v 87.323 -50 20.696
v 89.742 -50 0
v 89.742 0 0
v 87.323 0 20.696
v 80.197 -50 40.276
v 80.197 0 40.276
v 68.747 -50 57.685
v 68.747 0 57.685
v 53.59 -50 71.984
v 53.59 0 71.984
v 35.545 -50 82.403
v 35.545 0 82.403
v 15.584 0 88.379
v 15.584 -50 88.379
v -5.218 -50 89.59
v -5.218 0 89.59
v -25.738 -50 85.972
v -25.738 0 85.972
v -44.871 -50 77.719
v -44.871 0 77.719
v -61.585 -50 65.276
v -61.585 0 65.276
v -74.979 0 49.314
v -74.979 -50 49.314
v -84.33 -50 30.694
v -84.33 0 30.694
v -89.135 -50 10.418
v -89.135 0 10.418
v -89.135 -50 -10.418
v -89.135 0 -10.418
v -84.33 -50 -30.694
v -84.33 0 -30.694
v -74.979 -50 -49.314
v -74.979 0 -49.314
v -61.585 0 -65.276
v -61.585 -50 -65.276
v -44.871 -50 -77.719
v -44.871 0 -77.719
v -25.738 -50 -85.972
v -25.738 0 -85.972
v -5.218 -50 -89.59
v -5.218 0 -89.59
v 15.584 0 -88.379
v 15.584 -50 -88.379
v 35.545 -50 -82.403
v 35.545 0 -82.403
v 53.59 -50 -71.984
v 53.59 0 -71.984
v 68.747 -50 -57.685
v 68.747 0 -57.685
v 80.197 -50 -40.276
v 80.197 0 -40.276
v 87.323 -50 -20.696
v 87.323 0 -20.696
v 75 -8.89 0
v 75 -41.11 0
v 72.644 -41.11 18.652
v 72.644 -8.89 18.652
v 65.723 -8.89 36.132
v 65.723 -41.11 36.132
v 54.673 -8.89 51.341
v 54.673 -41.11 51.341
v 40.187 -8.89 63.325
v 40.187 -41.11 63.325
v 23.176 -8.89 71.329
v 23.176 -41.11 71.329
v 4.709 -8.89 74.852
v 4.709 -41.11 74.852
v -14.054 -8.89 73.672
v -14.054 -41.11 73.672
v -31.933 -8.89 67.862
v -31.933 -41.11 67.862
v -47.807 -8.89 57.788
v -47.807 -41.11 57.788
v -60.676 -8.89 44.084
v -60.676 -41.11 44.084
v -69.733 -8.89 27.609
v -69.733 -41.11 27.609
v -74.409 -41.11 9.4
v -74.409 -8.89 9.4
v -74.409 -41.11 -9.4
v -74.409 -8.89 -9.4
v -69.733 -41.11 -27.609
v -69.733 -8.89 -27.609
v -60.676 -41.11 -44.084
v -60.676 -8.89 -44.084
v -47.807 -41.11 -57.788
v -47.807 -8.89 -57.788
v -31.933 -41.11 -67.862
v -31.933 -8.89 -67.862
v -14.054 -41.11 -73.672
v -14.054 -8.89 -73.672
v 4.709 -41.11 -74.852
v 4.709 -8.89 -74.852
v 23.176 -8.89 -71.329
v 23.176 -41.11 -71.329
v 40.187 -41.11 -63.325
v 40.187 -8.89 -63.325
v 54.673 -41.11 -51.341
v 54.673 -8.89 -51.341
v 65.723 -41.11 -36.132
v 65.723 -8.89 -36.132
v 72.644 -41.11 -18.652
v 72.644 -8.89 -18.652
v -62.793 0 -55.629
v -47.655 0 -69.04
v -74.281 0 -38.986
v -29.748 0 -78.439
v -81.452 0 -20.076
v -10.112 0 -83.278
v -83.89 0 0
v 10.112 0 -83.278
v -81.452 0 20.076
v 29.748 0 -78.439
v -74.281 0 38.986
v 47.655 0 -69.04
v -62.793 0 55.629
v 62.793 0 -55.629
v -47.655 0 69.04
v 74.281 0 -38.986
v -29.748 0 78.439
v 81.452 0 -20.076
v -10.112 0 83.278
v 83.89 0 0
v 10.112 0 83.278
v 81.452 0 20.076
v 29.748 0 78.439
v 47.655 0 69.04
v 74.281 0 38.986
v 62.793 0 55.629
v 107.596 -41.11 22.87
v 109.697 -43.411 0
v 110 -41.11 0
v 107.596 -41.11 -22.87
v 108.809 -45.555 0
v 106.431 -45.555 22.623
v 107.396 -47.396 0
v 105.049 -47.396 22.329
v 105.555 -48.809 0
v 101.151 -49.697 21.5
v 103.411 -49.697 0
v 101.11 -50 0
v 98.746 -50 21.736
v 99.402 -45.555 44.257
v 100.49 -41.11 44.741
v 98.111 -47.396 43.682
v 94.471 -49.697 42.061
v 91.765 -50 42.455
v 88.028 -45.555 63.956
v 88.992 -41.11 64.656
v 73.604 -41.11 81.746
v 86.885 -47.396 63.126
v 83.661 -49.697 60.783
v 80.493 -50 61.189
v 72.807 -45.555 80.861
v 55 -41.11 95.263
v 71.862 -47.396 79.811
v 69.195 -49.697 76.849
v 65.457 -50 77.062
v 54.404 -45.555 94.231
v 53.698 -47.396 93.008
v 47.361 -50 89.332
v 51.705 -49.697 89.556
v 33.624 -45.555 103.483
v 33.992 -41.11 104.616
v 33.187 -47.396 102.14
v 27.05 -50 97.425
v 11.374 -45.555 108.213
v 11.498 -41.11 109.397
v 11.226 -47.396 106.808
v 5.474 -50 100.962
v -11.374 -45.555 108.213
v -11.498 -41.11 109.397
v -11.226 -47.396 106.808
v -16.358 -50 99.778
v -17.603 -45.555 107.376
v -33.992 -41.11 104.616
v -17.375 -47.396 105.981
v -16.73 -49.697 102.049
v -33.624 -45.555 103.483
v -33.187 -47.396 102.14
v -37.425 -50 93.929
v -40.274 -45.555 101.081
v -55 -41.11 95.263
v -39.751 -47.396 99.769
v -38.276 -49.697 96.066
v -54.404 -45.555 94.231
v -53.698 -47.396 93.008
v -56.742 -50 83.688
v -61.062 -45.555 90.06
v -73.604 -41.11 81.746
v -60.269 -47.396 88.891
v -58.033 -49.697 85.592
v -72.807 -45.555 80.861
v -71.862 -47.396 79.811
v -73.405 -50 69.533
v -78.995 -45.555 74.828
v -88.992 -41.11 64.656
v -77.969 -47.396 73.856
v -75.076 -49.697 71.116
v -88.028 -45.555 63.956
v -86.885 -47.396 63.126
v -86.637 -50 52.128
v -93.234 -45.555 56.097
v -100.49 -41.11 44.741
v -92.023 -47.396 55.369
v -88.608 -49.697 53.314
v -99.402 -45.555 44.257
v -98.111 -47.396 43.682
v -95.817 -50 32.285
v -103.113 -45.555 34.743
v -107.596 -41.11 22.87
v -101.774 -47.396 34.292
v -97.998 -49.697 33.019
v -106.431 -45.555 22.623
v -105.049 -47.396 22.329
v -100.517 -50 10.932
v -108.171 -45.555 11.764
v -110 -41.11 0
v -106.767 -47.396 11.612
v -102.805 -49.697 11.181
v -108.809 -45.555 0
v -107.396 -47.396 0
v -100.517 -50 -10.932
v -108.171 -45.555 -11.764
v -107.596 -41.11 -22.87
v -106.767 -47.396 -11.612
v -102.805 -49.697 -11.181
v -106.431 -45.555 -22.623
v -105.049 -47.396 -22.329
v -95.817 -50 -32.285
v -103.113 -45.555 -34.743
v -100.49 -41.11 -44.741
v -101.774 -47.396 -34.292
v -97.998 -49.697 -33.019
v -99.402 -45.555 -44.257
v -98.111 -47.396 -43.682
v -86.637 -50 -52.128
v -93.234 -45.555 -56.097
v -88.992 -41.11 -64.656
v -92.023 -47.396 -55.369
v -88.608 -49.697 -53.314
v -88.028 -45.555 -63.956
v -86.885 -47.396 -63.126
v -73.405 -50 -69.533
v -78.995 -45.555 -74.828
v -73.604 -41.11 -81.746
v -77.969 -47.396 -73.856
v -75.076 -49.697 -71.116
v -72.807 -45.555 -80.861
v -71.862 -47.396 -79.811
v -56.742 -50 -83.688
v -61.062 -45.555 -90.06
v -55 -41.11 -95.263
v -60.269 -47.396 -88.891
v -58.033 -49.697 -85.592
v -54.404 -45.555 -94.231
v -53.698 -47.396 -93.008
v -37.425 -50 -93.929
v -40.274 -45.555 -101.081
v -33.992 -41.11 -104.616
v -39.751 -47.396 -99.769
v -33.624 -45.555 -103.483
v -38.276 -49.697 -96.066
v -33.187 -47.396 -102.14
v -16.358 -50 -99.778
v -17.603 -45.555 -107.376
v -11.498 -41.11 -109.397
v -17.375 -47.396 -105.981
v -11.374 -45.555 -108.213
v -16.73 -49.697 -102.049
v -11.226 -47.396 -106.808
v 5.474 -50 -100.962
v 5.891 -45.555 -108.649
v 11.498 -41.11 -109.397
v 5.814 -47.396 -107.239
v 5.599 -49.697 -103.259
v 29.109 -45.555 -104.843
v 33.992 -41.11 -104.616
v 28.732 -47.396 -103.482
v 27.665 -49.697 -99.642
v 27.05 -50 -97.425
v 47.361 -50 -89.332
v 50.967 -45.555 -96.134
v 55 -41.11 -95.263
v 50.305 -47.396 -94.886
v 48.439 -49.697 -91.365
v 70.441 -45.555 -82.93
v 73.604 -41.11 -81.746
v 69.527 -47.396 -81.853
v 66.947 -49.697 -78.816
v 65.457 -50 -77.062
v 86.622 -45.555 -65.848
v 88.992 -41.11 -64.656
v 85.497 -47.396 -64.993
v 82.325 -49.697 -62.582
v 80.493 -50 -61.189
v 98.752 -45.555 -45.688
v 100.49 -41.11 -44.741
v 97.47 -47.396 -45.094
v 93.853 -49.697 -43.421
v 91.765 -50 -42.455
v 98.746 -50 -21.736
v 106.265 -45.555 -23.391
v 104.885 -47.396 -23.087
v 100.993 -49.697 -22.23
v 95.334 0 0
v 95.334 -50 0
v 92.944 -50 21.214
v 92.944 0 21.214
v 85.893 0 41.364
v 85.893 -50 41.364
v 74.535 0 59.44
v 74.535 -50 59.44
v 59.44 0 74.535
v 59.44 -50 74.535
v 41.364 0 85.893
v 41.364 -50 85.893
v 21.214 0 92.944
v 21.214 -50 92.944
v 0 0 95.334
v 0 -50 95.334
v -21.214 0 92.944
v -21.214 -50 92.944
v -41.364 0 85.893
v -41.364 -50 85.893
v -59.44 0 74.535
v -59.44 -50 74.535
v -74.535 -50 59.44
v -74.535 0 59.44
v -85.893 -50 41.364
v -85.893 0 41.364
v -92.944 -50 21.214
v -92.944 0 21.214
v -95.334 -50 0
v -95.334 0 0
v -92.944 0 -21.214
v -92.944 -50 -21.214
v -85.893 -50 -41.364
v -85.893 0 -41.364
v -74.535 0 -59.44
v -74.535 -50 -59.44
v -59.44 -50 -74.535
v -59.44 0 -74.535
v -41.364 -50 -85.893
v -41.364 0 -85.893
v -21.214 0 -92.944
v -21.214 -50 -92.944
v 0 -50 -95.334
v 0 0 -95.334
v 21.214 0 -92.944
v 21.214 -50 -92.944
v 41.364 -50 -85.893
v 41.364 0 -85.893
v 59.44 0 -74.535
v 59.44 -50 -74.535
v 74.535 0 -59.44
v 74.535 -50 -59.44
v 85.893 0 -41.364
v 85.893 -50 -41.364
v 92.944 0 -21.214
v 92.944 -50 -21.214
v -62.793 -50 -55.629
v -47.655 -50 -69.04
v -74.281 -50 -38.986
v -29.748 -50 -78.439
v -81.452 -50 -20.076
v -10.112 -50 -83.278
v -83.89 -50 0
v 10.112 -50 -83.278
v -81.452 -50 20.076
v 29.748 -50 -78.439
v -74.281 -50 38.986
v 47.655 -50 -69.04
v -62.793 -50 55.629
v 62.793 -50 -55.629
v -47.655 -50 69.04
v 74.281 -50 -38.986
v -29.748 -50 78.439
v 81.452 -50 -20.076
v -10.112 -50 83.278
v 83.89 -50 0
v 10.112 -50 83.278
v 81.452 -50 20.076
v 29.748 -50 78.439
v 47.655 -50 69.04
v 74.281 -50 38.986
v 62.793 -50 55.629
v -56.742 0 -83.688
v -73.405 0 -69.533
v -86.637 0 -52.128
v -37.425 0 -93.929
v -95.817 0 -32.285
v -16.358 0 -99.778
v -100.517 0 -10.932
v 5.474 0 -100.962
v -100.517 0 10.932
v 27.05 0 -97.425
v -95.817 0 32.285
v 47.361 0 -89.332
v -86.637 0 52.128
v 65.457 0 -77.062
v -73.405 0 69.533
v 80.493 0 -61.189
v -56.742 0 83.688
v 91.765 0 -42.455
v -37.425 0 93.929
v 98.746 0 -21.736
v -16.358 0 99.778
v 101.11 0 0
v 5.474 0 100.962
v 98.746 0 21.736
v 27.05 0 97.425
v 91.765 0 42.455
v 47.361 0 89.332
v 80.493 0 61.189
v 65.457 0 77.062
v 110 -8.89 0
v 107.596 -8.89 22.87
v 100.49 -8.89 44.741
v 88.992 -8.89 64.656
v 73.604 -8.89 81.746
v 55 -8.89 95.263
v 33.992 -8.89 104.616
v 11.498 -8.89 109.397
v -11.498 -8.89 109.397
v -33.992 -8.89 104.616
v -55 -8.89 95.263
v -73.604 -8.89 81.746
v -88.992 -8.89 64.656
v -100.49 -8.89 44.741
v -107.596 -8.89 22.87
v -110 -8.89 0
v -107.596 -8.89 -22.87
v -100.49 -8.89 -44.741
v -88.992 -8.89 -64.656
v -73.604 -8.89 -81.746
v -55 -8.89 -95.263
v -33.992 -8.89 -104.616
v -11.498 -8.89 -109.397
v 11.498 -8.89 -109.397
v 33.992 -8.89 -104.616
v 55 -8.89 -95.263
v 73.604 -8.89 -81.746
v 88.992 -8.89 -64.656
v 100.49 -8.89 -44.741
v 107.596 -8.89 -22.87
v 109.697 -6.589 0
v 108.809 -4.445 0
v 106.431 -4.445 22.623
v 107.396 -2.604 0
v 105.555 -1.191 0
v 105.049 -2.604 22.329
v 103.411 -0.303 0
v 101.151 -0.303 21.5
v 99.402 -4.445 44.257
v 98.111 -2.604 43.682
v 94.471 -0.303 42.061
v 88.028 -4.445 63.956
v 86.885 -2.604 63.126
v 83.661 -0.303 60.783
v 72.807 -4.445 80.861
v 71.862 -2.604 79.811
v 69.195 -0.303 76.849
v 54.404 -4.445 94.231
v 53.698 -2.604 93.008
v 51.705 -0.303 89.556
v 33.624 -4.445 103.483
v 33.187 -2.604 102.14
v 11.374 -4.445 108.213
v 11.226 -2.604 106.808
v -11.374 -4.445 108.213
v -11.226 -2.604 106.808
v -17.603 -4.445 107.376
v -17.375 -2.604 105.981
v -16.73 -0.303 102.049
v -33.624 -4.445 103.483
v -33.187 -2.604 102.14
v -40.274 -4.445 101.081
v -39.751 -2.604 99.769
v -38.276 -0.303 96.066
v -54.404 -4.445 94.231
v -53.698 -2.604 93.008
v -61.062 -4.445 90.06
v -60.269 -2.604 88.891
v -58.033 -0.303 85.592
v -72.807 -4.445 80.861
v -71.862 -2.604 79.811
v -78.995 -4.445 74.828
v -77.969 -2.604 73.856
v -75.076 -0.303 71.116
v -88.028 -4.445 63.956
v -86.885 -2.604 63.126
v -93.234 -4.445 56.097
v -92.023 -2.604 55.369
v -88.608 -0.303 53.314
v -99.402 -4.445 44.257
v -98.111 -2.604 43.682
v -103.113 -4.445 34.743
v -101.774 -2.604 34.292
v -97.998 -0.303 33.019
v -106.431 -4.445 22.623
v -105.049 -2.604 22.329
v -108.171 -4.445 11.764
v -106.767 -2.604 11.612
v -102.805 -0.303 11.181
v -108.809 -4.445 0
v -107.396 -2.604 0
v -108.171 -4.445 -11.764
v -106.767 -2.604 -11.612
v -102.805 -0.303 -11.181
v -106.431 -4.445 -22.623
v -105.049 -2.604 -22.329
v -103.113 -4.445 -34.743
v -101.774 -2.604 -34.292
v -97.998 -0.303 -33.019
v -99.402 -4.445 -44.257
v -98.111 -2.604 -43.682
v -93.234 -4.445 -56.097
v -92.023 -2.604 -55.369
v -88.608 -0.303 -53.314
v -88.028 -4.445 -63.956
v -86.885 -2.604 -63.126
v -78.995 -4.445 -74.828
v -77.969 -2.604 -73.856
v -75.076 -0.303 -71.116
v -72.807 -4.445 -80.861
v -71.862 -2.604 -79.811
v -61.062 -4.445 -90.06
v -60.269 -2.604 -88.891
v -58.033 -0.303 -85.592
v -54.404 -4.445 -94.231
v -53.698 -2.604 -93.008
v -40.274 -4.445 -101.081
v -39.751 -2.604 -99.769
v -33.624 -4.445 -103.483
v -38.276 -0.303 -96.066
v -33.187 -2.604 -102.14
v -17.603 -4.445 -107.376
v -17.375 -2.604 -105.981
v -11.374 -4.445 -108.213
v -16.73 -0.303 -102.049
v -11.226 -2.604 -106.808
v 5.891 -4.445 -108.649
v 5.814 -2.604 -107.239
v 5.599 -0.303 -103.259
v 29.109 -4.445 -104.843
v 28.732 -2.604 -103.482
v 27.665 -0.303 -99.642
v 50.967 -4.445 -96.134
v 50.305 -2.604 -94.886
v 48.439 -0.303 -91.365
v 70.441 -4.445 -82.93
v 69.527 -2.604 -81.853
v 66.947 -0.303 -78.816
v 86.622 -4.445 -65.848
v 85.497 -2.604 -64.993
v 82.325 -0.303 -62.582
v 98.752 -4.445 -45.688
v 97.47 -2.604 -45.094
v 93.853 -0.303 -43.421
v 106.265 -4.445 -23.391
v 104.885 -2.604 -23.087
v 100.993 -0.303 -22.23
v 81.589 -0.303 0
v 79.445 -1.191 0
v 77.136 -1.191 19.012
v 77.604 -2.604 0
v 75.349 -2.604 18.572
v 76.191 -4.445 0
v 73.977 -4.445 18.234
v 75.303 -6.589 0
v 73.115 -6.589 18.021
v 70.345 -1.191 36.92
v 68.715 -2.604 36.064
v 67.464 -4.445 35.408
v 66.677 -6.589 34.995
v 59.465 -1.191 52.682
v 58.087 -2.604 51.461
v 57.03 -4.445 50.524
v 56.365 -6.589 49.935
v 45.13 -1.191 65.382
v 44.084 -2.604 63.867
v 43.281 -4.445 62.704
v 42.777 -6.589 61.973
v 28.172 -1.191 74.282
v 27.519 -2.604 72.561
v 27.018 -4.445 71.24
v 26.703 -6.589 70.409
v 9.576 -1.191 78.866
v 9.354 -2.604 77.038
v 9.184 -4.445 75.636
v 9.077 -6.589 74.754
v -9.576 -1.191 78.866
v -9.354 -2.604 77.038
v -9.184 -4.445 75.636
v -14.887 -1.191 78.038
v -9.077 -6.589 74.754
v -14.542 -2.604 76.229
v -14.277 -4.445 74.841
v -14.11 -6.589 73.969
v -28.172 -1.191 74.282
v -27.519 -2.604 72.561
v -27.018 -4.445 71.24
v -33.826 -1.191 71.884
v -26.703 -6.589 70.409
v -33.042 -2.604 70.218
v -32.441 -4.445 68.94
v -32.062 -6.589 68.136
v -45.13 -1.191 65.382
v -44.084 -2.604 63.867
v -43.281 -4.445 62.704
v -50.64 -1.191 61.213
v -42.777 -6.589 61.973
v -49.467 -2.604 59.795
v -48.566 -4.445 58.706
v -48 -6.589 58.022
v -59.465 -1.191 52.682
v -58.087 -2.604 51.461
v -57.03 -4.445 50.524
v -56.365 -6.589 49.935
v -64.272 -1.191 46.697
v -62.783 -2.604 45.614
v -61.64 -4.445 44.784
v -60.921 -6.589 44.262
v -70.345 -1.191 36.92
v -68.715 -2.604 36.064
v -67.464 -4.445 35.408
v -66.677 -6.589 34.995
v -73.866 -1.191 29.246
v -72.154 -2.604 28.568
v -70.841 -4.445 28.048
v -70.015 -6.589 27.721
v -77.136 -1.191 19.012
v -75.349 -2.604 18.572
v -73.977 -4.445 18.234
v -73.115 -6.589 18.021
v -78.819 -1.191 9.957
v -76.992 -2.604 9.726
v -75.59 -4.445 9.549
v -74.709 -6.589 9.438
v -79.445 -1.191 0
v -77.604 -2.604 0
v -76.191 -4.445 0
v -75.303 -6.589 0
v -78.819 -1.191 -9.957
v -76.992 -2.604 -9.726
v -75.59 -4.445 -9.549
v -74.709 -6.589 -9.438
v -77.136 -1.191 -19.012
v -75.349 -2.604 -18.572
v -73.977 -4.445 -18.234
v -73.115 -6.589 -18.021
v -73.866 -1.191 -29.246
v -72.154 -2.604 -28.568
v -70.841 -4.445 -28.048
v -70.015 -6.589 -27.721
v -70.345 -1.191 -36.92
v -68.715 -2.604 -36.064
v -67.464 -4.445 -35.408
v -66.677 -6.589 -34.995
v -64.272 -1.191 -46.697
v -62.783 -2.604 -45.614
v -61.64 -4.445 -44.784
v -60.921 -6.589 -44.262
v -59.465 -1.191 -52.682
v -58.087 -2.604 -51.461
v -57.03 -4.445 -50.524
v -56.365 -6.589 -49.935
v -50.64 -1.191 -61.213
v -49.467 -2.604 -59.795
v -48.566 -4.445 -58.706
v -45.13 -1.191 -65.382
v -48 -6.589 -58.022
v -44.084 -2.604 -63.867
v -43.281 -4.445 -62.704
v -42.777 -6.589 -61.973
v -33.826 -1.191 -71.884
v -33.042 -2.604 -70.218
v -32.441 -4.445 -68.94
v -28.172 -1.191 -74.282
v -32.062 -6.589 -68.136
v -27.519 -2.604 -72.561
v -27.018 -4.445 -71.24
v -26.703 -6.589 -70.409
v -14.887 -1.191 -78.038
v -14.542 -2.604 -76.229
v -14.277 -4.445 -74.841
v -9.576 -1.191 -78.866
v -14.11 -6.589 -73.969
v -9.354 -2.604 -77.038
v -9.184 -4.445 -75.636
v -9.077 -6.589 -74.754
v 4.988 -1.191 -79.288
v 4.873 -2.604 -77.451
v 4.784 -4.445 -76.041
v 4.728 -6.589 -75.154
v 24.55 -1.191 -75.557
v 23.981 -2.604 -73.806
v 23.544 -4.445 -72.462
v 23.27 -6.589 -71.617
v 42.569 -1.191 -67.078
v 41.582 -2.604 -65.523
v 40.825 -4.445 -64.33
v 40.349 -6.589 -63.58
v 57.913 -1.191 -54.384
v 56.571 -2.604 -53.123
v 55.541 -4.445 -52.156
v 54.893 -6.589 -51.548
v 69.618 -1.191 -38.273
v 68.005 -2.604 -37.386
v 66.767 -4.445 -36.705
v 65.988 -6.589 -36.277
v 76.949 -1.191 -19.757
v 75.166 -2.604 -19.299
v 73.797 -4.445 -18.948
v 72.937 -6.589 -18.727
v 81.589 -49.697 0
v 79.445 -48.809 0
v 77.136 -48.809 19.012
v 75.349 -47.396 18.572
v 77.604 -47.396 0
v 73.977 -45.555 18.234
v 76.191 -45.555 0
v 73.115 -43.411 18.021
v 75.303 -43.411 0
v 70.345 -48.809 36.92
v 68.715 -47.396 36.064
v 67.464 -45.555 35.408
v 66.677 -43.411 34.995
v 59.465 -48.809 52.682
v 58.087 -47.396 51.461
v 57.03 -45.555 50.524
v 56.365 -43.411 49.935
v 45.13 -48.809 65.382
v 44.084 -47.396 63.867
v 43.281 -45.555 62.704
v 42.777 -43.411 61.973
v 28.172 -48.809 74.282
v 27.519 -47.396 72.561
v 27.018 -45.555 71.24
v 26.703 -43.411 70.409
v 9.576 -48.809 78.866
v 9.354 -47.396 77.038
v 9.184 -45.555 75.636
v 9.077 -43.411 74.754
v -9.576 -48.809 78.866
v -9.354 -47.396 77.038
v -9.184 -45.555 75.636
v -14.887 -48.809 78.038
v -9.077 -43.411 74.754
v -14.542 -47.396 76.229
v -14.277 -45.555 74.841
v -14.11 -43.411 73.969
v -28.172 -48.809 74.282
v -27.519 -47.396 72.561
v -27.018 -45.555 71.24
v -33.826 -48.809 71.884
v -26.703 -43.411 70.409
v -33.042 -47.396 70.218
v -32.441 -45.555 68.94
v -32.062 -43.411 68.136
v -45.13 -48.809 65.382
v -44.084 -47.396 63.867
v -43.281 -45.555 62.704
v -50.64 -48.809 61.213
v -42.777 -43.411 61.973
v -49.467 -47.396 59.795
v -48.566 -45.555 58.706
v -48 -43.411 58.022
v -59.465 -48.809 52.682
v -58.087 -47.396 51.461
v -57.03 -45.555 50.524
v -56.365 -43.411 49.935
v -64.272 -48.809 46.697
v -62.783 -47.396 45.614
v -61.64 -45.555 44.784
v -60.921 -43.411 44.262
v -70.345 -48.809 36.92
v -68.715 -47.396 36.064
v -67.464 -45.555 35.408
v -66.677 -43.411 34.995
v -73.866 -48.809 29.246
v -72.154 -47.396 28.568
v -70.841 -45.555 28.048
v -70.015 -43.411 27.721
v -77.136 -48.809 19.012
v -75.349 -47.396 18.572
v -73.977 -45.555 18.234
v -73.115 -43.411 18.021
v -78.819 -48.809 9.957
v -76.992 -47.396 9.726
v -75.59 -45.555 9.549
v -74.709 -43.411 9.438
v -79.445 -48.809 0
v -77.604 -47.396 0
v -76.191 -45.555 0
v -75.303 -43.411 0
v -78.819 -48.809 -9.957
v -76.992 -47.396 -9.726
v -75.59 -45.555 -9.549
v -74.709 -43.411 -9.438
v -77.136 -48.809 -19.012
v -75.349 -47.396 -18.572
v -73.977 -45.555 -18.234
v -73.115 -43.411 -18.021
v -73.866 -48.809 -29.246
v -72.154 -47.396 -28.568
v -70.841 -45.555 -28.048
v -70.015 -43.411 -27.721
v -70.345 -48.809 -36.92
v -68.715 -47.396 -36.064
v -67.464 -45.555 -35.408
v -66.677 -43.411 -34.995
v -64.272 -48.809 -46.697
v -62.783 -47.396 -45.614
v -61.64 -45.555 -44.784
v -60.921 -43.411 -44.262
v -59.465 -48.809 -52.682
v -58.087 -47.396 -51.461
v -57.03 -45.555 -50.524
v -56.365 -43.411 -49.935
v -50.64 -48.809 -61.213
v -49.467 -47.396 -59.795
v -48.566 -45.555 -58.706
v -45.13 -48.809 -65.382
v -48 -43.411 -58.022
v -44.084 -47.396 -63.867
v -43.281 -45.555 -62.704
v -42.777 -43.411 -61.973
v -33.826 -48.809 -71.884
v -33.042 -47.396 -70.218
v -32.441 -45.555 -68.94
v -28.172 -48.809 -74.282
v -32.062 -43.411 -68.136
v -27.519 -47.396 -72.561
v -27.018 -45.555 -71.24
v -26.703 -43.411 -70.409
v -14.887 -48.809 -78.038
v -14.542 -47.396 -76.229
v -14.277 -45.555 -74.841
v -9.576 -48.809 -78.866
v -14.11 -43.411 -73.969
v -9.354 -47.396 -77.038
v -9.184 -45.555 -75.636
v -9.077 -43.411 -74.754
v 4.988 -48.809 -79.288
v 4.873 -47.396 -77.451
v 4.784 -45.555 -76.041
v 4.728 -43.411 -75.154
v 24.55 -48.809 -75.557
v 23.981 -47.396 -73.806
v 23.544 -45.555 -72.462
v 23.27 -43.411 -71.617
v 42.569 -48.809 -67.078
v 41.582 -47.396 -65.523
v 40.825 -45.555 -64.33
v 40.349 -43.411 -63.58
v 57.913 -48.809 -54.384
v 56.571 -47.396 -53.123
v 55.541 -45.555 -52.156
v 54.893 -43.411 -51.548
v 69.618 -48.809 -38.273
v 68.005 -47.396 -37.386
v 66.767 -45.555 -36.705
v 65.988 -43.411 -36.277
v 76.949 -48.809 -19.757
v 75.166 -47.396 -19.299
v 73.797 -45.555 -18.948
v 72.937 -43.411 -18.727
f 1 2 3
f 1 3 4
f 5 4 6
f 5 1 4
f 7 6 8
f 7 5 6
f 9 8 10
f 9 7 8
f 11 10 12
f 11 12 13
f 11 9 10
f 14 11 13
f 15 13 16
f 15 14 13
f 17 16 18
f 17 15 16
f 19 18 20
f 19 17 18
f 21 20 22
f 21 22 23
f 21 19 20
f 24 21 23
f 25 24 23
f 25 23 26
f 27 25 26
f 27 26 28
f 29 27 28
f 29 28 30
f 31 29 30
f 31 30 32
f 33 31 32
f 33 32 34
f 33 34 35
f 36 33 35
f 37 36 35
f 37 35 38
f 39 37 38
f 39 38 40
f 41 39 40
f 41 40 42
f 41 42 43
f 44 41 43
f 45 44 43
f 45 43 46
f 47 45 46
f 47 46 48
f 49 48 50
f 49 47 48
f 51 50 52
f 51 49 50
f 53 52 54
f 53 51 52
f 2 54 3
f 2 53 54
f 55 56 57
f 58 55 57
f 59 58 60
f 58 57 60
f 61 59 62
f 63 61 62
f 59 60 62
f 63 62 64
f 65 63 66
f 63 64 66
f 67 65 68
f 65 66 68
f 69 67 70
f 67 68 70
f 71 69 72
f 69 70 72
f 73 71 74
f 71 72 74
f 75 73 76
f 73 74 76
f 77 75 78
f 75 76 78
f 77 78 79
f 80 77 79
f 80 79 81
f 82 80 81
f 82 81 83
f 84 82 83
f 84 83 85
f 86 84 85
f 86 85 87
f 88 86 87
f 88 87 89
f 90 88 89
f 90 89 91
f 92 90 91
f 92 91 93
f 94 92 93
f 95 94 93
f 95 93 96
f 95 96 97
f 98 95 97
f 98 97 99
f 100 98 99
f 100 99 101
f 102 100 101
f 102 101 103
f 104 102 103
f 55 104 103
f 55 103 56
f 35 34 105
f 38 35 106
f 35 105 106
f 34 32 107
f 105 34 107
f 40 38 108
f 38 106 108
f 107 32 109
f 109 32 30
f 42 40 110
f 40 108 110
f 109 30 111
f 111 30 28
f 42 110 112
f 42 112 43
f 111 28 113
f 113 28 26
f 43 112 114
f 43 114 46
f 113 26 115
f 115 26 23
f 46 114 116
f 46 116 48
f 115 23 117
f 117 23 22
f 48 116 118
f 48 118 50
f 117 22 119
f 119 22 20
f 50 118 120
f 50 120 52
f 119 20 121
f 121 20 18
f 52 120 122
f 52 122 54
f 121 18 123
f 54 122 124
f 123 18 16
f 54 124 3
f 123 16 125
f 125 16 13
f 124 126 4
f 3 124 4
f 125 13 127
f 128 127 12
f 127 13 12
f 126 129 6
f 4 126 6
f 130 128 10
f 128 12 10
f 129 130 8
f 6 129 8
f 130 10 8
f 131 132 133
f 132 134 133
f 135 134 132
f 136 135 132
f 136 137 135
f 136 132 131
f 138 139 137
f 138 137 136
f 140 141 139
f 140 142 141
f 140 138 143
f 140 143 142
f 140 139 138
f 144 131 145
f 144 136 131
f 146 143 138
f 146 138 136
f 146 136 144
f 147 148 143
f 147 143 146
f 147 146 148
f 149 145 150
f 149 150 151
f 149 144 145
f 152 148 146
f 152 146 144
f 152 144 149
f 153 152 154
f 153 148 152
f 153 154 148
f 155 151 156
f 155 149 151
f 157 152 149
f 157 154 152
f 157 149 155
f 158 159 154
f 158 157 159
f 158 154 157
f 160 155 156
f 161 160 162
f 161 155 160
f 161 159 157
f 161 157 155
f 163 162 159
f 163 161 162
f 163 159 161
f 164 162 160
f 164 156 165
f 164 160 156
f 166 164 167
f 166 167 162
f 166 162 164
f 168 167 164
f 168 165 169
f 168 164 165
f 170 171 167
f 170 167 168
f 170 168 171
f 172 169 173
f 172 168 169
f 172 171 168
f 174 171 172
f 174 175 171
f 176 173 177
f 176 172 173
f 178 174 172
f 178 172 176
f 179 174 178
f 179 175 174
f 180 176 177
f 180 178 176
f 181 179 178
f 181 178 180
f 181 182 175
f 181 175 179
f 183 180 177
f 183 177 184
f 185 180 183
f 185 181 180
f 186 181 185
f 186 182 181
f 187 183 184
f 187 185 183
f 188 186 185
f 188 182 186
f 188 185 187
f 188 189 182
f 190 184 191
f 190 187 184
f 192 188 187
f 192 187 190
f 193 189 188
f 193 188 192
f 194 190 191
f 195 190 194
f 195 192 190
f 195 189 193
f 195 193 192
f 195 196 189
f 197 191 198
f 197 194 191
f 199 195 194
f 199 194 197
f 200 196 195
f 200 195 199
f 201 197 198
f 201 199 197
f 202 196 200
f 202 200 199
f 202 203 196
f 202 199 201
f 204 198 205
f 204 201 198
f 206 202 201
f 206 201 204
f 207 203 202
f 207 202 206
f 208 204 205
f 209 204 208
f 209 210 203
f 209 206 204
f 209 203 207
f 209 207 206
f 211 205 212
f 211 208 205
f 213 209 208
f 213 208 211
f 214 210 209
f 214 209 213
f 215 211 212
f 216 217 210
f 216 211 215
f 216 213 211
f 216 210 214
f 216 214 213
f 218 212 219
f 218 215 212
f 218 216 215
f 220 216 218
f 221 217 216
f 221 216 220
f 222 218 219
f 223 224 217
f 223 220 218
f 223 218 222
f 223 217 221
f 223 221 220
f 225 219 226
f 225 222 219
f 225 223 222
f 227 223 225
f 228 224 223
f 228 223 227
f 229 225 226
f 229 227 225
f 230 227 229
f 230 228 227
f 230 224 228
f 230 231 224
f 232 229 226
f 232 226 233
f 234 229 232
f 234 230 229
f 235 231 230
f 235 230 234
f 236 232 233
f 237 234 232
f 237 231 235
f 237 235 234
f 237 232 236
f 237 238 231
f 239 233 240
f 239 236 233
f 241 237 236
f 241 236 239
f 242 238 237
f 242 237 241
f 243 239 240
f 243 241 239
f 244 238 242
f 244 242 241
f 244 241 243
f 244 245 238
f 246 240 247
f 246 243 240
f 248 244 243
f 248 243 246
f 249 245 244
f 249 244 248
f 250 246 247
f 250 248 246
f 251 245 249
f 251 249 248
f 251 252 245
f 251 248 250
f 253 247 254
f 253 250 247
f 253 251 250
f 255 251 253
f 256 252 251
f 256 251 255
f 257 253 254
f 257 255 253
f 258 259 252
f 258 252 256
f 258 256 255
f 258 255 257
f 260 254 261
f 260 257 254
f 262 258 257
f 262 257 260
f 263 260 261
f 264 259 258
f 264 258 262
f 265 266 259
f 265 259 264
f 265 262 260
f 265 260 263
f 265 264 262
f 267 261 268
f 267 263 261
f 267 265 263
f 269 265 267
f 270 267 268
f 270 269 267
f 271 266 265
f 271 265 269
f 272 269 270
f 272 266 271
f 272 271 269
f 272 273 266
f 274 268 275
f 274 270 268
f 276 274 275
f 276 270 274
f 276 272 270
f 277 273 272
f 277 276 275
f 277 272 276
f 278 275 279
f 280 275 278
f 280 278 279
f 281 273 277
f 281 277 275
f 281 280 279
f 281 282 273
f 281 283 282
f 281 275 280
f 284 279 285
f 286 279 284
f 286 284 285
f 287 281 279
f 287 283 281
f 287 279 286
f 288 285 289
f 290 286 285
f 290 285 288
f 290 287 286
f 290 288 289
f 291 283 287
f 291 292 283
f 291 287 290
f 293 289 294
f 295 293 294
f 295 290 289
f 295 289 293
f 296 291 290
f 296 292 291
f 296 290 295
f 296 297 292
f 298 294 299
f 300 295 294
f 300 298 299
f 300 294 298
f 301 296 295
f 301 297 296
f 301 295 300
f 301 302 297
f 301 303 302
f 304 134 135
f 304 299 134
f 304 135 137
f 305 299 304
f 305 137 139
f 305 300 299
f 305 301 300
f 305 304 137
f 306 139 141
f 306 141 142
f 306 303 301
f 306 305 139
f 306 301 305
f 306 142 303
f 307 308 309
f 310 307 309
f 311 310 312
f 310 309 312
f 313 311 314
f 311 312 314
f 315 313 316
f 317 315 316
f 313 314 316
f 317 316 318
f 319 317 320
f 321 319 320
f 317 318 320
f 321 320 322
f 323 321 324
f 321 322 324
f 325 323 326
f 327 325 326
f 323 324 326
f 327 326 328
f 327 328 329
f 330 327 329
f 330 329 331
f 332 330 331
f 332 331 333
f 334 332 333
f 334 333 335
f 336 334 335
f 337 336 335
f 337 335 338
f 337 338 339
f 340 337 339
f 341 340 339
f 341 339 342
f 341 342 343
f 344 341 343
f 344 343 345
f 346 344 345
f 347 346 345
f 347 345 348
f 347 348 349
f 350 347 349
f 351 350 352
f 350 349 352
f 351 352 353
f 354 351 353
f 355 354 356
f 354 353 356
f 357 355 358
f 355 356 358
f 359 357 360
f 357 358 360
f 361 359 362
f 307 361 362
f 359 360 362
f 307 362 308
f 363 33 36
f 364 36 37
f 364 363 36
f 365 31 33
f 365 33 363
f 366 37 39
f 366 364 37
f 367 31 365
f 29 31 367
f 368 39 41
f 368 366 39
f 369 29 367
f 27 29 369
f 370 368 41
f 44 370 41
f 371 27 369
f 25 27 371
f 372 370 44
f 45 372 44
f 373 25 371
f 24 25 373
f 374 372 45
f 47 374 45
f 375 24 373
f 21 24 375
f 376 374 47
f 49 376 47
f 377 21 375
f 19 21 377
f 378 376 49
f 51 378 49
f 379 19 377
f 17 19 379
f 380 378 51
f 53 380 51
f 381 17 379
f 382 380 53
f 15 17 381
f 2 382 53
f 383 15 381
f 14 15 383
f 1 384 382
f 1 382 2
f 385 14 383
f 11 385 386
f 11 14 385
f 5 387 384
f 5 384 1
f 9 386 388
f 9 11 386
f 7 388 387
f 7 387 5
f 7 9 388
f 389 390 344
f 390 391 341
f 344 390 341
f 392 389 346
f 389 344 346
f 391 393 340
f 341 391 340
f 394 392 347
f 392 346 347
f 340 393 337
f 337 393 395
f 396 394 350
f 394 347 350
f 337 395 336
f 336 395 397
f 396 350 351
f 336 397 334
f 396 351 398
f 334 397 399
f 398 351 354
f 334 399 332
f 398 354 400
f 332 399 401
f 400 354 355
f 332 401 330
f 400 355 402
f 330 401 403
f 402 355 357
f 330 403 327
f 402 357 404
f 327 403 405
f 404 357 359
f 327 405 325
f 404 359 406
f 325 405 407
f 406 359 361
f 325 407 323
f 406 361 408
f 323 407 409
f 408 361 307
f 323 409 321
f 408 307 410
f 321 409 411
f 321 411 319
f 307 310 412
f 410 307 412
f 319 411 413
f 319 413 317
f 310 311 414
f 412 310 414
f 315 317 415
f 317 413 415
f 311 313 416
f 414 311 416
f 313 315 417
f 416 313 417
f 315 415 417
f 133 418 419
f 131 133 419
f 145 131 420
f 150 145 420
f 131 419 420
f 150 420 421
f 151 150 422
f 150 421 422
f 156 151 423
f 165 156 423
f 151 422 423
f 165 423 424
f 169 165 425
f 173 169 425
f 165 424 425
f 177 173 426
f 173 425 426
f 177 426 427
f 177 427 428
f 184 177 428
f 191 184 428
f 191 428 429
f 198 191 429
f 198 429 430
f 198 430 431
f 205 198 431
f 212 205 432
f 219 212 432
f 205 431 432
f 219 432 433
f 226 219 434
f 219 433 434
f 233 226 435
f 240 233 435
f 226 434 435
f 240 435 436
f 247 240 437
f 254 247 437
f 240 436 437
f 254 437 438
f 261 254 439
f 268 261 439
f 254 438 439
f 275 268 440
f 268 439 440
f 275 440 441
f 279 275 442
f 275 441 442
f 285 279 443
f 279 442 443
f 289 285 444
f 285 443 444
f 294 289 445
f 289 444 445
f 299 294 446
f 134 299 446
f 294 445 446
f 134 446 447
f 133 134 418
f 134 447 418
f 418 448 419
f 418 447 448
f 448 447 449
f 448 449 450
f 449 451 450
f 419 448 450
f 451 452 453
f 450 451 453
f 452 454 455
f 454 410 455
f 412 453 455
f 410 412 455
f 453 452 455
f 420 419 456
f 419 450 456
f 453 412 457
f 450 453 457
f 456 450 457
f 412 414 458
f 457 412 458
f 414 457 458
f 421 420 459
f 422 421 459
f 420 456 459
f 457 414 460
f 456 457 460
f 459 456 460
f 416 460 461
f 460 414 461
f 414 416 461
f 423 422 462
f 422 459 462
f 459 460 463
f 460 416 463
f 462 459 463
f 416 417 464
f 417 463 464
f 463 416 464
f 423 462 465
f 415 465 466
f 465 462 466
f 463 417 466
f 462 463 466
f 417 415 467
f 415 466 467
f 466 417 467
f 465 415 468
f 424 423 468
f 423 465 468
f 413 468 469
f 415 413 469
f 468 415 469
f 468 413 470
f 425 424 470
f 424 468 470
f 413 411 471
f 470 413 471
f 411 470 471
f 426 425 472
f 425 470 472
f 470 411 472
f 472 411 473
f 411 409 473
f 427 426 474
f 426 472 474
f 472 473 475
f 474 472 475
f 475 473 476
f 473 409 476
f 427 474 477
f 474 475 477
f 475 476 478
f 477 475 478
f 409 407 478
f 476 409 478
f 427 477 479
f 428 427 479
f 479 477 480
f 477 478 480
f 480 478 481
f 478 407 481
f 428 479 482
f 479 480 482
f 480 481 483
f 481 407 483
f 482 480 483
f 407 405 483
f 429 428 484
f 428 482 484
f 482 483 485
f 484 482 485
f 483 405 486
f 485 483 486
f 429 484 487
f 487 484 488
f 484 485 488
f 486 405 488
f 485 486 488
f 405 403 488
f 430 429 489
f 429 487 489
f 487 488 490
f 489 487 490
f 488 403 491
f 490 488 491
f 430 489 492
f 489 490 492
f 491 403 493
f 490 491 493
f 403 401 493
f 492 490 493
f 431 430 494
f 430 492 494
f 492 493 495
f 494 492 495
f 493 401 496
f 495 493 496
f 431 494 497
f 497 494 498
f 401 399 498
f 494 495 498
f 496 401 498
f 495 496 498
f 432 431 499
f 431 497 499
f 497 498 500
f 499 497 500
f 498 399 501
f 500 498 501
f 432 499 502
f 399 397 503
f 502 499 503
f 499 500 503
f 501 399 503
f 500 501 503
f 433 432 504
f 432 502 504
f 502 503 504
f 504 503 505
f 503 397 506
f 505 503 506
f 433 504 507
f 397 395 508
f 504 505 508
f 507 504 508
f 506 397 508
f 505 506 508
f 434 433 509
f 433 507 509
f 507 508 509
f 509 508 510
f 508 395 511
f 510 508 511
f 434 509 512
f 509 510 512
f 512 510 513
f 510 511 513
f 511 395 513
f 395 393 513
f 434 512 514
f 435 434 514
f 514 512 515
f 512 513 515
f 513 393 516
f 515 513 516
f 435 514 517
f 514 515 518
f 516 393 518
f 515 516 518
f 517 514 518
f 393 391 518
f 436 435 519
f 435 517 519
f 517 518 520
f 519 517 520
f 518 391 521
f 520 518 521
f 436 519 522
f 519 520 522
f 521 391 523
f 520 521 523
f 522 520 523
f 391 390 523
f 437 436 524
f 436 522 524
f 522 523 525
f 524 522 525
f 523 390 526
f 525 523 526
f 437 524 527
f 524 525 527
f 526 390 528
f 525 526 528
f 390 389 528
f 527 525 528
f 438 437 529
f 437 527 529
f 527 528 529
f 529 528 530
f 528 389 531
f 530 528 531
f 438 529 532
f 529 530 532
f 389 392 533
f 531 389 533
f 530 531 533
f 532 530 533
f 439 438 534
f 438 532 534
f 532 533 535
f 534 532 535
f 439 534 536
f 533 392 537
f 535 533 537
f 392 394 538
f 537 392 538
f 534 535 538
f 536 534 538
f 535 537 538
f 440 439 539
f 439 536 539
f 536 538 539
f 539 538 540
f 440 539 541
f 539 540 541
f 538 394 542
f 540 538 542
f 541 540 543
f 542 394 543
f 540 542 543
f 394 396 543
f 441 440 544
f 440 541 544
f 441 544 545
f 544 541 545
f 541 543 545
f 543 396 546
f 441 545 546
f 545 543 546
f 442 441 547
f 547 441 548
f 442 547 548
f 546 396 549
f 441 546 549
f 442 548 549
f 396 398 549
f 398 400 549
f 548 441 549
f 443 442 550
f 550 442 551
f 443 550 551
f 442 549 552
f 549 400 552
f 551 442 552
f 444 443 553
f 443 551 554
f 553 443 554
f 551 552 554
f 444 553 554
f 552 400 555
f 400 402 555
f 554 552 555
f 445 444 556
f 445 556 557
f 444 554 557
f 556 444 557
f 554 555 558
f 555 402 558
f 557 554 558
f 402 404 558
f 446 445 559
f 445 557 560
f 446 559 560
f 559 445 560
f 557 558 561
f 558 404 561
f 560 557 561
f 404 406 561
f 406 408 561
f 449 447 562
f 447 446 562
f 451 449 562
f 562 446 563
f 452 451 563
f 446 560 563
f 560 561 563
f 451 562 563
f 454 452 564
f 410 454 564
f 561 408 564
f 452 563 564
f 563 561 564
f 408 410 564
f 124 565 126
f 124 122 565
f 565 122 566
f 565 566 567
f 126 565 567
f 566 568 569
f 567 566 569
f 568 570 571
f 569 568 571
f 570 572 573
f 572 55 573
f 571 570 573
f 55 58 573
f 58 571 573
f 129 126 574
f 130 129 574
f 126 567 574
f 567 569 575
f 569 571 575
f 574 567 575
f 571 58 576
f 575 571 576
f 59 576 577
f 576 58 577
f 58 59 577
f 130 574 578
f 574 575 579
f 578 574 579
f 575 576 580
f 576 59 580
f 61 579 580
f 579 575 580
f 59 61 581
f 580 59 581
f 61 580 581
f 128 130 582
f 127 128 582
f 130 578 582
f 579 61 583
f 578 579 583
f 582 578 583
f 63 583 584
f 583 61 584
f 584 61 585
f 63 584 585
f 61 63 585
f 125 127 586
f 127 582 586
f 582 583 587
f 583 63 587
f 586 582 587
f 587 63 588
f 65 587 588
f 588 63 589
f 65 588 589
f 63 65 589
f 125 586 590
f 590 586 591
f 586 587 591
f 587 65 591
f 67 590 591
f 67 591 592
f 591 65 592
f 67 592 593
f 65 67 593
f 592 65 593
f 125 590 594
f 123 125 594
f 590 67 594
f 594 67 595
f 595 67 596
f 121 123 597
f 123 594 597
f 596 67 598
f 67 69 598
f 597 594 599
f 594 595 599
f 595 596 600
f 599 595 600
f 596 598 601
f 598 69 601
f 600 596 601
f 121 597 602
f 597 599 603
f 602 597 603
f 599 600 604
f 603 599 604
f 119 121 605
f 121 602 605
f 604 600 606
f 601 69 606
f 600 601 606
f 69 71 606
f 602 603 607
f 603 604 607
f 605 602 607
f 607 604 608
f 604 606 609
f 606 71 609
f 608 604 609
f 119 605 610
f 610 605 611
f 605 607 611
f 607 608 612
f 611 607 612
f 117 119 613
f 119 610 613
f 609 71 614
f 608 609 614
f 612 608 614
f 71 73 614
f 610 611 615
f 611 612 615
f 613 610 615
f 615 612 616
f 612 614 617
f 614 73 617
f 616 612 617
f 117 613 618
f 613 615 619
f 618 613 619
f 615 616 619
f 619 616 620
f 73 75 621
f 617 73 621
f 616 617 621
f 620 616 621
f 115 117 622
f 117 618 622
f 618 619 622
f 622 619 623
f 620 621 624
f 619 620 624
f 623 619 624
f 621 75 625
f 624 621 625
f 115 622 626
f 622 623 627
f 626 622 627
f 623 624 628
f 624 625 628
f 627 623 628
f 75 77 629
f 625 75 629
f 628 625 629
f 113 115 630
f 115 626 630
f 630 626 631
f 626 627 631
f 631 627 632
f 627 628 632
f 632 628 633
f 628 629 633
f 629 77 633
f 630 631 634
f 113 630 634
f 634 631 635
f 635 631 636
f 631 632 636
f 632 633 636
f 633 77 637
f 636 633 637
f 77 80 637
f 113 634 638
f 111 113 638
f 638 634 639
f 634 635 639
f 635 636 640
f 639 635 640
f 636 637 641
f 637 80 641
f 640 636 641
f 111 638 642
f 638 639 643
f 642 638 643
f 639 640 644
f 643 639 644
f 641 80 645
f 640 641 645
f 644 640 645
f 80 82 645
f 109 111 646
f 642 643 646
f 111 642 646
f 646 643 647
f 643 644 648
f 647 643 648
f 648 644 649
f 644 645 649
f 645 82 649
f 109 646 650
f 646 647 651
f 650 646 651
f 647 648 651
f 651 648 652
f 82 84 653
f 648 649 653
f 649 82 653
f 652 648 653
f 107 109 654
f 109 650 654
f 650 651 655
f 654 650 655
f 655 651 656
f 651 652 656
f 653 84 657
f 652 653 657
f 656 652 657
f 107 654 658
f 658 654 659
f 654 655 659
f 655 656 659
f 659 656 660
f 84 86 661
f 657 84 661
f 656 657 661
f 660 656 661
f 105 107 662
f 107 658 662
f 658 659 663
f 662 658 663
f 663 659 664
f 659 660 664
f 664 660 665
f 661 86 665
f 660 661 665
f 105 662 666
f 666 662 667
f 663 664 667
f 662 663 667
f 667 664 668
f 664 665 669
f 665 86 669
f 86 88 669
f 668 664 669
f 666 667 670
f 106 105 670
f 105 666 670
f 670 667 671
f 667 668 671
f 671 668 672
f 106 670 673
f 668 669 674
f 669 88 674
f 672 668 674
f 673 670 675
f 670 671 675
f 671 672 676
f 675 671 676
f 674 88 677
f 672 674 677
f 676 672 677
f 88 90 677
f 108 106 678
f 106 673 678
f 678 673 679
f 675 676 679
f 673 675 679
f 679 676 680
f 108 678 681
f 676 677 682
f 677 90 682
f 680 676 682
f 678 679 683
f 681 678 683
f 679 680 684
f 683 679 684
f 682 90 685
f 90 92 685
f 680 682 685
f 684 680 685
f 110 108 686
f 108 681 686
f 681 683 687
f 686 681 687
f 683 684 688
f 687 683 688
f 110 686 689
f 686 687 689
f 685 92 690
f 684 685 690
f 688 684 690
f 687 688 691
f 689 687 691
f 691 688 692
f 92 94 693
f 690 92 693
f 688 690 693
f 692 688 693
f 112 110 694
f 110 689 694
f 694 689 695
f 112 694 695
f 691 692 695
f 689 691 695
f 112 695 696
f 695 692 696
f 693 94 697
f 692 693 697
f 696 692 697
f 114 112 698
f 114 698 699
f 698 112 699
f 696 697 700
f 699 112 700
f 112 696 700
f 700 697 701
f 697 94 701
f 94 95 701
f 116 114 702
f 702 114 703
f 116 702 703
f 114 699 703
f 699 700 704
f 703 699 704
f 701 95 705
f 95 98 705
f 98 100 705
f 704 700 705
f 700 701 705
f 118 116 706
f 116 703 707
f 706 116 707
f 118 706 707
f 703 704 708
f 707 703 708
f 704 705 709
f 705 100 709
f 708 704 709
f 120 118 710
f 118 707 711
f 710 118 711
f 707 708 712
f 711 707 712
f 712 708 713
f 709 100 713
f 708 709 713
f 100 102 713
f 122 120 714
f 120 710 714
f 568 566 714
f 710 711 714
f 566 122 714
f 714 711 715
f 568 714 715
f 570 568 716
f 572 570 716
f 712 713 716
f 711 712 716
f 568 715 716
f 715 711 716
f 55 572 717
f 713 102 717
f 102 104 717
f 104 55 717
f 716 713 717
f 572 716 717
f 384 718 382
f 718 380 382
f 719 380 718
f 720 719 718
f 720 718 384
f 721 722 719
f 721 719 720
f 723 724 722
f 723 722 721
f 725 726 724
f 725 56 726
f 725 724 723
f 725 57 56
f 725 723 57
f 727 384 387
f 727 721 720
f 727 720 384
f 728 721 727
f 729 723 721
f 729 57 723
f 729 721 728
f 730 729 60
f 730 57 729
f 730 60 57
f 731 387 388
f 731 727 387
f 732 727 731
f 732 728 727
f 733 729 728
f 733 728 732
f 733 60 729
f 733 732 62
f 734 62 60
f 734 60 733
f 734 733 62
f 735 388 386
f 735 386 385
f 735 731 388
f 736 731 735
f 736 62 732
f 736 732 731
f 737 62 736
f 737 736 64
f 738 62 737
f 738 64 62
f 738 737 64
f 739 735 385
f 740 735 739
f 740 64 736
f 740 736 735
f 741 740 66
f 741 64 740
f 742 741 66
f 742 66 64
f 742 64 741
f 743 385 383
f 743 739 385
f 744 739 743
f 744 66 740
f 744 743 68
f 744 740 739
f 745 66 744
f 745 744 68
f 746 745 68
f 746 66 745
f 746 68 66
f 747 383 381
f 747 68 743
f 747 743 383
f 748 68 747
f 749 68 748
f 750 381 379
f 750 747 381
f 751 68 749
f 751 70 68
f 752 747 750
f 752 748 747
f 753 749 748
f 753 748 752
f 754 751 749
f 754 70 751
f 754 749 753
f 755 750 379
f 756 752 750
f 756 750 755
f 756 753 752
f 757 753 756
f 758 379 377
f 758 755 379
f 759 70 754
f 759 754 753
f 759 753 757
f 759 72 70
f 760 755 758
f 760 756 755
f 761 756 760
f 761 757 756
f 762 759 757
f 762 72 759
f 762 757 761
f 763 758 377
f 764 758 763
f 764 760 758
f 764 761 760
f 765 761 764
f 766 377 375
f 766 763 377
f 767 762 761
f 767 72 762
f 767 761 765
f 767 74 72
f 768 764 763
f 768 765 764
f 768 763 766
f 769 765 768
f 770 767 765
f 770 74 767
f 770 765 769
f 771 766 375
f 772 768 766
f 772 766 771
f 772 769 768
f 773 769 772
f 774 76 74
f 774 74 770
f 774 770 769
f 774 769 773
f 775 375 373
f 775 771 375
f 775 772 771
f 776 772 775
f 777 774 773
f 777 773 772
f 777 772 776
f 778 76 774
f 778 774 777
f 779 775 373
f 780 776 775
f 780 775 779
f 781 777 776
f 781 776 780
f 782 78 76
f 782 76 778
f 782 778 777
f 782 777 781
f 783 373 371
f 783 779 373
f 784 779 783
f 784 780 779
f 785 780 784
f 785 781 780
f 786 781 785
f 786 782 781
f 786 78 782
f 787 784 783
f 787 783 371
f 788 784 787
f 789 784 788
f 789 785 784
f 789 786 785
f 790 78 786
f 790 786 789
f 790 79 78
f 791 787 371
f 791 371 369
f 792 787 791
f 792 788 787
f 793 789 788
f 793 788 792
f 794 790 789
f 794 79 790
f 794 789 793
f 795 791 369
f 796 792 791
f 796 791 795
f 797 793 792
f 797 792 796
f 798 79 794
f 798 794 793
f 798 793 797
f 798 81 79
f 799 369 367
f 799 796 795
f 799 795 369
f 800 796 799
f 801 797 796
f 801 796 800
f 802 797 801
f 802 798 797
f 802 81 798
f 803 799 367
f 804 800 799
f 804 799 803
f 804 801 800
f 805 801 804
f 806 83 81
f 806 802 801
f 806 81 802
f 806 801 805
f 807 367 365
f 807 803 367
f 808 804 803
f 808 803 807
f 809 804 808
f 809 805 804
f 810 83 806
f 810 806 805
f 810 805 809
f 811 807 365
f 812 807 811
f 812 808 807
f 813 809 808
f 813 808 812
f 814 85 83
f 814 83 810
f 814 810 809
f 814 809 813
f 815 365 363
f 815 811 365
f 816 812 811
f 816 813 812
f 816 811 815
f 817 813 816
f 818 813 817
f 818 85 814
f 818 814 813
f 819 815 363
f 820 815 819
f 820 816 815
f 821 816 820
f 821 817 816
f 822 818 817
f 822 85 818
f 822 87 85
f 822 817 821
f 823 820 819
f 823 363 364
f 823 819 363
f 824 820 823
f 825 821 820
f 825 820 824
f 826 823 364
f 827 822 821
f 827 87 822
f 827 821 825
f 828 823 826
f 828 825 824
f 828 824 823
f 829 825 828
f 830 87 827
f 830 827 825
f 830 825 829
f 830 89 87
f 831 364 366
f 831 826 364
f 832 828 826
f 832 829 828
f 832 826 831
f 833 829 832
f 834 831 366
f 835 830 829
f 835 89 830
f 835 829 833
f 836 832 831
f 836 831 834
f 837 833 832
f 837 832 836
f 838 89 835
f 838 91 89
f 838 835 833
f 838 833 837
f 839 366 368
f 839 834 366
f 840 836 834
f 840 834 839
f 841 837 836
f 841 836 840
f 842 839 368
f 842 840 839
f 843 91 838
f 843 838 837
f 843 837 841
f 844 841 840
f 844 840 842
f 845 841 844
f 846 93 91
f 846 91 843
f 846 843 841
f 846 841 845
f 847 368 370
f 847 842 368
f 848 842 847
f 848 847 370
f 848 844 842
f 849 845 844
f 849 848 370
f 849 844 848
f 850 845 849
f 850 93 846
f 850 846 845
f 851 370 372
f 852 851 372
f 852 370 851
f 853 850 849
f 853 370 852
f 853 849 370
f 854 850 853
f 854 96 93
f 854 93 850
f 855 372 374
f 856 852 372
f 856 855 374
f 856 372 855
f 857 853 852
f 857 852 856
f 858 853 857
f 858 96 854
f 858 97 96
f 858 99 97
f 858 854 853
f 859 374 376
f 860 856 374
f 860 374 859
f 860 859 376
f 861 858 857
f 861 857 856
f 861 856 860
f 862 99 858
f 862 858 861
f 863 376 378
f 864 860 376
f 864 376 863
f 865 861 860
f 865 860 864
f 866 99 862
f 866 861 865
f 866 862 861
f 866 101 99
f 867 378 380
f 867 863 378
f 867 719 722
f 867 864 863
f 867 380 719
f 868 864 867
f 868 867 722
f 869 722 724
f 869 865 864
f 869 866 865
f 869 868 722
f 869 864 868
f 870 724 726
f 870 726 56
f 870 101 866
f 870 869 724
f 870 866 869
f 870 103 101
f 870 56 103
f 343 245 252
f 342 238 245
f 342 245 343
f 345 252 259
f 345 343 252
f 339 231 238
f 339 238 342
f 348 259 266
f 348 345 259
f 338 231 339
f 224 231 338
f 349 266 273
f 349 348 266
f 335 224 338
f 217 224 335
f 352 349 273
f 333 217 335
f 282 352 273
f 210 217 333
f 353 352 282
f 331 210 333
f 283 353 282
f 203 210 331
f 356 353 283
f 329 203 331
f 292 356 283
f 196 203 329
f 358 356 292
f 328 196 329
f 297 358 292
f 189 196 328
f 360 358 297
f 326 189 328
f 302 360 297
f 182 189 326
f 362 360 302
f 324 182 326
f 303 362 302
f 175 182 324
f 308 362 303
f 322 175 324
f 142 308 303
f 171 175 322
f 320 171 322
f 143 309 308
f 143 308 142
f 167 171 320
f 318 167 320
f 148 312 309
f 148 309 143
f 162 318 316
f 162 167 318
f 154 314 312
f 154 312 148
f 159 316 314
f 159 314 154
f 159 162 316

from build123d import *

# Parameters (mm, degrees)
F0_R     = 110
F1_DEPTH = 50
F2_R     = 75
F3_DEPTH = 50.001
F7_R     = 8.89
F8_R     = 95.3337412029
F8_R_2   = 89.742282657
F9_DEPTH = 50.001


# Not quite as in the source:
# - the program builds the solid bodies; features that only make, move or delete a surface that nothing else refers to are left out


with BuildPart() as f1:
    # F0 (on Front) → F1 (new body)
    with BuildSketch(Plane.XZ):
        Circle(F0_R)
    extrude(amount=F1_DEPTH)

    # F2 (on face) → F3 (cut, through all)
    with BuildSketch(Plane.XZ.offset(50)):
        Circle(F2_R)
    extrude(amount=-F3_DEPTH, mode=Mode.SUBTRACT)

    # F7
    f7_edges = [f1.edges().sort_by_distance(p)[0] for p in [
        (-110, -50, 0),
        (-75, -50, 0),
        (-110, 0, 0),
        (-75, 0, 0),
    ]]
    fillet(f7_edges, radius=F7_R)

    # F8 (on face) → F9 (cut, through all)
    with BuildSketch(Plane.XZ.offset(50)):
        Circle(F8_R)
        Circle(F8_R_2, mode=Mode.SUBTRACT)
    extrude(amount=-F9_DEPTH, mode=Mode.SUBTRACT)


solid = f1.part
